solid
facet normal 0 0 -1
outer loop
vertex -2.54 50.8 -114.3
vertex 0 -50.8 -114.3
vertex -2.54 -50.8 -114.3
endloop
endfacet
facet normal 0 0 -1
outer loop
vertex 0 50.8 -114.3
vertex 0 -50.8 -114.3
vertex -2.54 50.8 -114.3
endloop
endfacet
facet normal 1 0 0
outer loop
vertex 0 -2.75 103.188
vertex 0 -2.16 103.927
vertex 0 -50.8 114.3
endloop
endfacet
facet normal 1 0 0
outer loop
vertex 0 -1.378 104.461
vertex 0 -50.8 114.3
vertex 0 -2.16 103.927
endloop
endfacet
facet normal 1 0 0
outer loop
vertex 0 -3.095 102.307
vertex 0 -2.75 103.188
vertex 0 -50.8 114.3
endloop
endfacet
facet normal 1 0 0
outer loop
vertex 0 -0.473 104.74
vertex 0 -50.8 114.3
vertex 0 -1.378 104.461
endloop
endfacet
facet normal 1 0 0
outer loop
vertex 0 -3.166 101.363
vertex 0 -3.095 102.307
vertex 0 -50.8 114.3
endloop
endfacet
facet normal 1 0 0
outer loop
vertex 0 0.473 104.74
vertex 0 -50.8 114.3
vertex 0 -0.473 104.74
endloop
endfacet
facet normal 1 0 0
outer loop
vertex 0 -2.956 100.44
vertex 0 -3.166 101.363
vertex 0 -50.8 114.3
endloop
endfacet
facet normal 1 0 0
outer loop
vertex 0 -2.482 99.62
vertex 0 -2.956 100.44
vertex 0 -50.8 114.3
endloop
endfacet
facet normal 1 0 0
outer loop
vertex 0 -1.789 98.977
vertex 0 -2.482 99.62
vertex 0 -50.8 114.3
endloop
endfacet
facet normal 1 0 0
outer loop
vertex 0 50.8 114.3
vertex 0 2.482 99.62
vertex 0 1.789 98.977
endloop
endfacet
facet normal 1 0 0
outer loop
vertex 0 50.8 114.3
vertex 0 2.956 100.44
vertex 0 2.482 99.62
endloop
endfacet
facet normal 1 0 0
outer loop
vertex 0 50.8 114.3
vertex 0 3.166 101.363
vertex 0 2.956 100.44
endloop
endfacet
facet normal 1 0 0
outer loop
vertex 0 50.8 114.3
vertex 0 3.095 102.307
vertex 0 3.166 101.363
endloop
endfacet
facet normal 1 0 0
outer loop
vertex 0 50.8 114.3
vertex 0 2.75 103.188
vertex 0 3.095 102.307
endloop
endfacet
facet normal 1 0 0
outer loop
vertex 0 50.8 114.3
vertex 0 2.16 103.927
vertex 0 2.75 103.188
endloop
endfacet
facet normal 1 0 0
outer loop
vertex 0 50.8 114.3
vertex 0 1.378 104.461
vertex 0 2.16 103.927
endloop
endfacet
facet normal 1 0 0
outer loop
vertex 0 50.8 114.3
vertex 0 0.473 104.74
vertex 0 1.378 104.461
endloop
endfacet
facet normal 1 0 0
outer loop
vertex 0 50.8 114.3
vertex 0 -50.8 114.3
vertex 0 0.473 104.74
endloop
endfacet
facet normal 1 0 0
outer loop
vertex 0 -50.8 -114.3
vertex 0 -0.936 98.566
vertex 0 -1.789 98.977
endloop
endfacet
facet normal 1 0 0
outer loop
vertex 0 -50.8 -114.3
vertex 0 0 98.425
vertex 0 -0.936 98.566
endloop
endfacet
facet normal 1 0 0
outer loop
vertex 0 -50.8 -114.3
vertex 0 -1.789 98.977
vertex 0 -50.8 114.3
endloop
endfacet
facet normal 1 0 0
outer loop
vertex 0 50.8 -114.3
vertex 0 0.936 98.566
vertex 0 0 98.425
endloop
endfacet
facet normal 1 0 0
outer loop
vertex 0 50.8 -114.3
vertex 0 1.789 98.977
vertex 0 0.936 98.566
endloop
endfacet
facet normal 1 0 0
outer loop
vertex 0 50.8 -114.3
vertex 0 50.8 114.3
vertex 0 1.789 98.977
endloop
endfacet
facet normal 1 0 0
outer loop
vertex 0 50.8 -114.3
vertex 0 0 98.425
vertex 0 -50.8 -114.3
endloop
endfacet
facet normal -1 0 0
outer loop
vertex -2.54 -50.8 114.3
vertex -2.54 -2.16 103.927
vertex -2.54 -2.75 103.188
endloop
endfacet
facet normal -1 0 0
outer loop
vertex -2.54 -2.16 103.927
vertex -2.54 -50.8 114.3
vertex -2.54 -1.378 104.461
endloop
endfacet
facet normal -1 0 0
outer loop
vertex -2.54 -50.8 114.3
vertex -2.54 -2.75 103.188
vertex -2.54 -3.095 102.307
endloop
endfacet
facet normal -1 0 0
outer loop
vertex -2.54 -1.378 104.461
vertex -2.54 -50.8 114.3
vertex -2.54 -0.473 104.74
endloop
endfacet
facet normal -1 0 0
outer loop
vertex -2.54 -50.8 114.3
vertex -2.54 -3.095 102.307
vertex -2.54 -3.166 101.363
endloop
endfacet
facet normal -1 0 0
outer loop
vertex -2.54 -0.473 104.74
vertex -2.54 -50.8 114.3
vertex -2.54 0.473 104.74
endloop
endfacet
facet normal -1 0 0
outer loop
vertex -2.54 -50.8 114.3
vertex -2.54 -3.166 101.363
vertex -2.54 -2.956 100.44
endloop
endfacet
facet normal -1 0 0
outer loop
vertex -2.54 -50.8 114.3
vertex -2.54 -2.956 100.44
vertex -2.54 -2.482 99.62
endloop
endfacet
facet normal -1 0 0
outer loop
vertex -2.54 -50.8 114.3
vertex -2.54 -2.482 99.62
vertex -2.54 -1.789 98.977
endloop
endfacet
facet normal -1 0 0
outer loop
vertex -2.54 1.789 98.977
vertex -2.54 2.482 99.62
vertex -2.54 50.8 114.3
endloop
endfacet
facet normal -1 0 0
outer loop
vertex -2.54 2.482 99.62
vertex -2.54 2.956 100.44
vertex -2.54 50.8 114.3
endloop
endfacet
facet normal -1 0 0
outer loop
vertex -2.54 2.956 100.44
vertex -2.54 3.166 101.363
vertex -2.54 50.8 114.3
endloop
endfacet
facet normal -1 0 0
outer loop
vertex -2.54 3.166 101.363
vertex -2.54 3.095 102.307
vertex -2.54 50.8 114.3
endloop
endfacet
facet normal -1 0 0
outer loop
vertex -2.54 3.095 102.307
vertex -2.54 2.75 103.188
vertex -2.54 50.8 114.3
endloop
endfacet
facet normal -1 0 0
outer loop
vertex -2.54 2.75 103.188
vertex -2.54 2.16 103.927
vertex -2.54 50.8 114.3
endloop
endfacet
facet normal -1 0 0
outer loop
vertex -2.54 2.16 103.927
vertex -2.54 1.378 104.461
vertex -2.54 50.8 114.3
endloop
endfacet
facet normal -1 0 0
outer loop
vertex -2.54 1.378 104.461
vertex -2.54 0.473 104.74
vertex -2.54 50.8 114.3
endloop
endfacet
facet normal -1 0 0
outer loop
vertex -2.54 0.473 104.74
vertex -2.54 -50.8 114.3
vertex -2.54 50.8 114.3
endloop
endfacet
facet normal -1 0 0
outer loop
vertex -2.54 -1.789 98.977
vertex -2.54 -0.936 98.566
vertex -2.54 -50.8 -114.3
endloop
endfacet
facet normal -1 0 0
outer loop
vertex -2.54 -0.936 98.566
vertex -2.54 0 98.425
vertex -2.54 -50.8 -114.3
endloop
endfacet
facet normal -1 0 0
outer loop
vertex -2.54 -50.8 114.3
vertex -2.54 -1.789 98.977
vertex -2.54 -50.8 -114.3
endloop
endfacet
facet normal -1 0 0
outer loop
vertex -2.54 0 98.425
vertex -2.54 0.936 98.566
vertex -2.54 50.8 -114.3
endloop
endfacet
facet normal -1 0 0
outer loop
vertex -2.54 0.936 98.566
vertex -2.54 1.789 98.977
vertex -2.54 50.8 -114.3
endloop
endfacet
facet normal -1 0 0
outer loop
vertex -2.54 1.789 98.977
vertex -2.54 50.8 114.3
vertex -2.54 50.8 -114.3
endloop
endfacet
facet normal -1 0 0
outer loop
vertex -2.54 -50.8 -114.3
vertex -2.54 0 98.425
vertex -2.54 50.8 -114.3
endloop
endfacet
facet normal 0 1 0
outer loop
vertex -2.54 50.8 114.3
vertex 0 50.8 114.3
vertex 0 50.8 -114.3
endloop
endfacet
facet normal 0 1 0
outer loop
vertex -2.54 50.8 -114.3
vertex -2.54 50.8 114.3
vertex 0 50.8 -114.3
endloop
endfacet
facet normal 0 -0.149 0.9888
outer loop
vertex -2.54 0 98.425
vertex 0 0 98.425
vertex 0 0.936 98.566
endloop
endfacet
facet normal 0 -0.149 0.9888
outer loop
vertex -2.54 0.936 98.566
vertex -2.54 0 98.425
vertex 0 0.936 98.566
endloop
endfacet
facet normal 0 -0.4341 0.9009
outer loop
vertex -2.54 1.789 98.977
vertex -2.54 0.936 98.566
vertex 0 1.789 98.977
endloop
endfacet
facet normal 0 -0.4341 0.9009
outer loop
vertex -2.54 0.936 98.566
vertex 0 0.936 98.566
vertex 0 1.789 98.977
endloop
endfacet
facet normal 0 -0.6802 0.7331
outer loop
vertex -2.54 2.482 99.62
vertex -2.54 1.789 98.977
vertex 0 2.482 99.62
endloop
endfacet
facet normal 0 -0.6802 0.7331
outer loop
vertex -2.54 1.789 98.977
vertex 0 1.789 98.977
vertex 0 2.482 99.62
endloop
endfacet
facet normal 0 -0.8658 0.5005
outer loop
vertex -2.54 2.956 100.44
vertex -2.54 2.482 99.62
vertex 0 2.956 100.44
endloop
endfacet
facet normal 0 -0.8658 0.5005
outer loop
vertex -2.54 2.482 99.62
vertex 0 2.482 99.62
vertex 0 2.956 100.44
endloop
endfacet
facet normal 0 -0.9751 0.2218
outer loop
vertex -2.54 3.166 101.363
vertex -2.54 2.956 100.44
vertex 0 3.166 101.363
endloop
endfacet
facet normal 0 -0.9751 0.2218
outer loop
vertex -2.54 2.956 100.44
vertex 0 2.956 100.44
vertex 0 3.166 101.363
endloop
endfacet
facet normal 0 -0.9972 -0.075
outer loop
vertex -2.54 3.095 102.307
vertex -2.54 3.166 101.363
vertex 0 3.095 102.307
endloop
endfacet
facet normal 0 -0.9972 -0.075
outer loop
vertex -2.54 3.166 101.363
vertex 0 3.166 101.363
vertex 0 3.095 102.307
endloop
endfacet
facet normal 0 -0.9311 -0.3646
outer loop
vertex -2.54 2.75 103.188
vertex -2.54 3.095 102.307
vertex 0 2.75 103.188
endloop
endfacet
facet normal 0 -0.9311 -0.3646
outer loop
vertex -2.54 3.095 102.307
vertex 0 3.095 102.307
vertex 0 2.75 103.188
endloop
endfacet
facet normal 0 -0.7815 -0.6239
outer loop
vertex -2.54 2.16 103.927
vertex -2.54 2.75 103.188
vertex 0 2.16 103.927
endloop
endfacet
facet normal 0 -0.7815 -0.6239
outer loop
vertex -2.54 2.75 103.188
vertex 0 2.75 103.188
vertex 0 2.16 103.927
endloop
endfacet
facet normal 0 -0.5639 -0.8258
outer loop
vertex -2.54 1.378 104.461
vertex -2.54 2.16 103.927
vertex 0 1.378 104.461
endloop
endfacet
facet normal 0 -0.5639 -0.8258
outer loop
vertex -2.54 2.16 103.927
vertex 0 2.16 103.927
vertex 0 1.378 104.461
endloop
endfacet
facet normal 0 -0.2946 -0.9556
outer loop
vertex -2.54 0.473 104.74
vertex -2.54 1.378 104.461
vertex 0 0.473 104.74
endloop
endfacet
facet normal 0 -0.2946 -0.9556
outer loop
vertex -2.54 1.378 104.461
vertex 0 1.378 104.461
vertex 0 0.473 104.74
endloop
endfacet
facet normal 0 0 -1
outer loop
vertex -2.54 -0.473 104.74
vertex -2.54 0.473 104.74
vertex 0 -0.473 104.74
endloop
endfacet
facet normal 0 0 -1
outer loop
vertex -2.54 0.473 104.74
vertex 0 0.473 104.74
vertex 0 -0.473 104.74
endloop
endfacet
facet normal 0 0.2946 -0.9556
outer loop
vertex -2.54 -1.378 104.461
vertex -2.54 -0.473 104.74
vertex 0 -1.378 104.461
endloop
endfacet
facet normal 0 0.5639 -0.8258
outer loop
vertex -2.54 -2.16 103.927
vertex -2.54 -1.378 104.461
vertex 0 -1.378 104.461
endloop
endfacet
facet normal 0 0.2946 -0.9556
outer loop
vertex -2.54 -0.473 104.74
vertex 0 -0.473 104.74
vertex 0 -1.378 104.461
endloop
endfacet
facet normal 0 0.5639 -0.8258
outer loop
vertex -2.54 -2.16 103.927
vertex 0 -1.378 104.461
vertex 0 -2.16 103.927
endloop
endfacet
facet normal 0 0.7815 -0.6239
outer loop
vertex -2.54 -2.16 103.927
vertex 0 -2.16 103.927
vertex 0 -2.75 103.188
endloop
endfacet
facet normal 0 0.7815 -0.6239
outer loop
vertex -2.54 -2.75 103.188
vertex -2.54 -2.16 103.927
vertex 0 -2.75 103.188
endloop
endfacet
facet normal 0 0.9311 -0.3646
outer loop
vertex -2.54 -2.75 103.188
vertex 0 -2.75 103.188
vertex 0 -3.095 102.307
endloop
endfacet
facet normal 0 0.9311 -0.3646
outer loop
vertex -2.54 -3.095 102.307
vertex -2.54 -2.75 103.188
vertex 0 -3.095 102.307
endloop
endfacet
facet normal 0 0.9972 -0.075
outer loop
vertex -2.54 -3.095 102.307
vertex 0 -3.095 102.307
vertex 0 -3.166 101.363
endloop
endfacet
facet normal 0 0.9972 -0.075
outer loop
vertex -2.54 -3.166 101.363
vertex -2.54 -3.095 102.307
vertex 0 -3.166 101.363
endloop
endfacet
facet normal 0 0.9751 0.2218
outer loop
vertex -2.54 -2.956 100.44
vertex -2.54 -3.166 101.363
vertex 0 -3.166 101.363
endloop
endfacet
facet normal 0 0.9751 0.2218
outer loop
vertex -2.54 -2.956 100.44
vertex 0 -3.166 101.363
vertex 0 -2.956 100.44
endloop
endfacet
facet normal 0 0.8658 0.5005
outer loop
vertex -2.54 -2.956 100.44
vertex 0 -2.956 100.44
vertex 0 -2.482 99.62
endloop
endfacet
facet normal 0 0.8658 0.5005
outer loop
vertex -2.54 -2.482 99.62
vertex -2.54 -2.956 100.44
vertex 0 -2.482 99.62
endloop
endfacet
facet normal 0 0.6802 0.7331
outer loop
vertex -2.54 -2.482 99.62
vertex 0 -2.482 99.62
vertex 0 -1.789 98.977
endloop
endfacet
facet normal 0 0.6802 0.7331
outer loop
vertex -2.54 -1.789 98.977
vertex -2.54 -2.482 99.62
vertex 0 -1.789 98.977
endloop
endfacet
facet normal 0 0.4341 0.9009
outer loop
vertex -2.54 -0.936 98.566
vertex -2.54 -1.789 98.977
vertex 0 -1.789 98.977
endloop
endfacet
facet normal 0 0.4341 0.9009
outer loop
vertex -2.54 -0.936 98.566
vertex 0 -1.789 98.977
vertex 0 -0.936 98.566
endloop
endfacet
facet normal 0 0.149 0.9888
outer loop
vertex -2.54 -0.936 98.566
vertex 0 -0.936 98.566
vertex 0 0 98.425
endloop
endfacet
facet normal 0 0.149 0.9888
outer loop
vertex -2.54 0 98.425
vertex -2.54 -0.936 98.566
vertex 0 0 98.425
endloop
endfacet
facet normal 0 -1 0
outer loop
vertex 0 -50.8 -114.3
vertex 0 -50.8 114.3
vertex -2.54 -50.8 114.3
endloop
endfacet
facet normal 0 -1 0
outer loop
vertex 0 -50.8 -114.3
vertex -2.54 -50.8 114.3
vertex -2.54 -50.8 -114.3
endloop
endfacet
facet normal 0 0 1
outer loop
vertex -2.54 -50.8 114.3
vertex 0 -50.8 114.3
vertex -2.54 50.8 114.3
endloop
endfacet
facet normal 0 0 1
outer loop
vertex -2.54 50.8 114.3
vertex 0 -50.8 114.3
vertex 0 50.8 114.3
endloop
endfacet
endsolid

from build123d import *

# Parameters (mm, degrees)
SKETCH1_W           = 228.6
SKETCH1_H           = 101.6
BOSS_EXTRUDE1_DEPTH = 2.54
CUT_EXTRUDE1_REACH  = 4.54
SKETCH2_R           = 3.175


with BuildPart() as part:
    # Sketch1 → Boss-Extrude1 (new body)
    with BuildSketch(Plane(origin=(0, 0, 0), x_dir=(0, 0, -1), z_dir=(1, 0, 0))):
        Rectangle(SKETCH1_W, SKETCH1_H)
    extrude(amount=-BOSS_EXTRUDE1_DEPTH)

    # Sketch2 → Cut-Extrude1 (cut, up to next)
    with BuildSketch(Plane(origin=(0, 0, 0), x_dir=(0, 0, -1), z_dir=(1, 0, 0)), mode=Mode.PRIVATE) as cut_extrude1_sk1:
        with Locations((-101.6, 0)):
            Circle(SKETCH2_R)
    cut_extrude1_tool1 = extrude(cut_extrude1_sk1.sketch, amount=-CUT_EXTRUDE1_REACH, mode=Mode.PRIVATE) & part.part
    add(cut_extrude1_tool1.solids().sort_by_distance((0, 0, 101.6))[0], mode=Mode.SUBTRACT)


solid = part.part
